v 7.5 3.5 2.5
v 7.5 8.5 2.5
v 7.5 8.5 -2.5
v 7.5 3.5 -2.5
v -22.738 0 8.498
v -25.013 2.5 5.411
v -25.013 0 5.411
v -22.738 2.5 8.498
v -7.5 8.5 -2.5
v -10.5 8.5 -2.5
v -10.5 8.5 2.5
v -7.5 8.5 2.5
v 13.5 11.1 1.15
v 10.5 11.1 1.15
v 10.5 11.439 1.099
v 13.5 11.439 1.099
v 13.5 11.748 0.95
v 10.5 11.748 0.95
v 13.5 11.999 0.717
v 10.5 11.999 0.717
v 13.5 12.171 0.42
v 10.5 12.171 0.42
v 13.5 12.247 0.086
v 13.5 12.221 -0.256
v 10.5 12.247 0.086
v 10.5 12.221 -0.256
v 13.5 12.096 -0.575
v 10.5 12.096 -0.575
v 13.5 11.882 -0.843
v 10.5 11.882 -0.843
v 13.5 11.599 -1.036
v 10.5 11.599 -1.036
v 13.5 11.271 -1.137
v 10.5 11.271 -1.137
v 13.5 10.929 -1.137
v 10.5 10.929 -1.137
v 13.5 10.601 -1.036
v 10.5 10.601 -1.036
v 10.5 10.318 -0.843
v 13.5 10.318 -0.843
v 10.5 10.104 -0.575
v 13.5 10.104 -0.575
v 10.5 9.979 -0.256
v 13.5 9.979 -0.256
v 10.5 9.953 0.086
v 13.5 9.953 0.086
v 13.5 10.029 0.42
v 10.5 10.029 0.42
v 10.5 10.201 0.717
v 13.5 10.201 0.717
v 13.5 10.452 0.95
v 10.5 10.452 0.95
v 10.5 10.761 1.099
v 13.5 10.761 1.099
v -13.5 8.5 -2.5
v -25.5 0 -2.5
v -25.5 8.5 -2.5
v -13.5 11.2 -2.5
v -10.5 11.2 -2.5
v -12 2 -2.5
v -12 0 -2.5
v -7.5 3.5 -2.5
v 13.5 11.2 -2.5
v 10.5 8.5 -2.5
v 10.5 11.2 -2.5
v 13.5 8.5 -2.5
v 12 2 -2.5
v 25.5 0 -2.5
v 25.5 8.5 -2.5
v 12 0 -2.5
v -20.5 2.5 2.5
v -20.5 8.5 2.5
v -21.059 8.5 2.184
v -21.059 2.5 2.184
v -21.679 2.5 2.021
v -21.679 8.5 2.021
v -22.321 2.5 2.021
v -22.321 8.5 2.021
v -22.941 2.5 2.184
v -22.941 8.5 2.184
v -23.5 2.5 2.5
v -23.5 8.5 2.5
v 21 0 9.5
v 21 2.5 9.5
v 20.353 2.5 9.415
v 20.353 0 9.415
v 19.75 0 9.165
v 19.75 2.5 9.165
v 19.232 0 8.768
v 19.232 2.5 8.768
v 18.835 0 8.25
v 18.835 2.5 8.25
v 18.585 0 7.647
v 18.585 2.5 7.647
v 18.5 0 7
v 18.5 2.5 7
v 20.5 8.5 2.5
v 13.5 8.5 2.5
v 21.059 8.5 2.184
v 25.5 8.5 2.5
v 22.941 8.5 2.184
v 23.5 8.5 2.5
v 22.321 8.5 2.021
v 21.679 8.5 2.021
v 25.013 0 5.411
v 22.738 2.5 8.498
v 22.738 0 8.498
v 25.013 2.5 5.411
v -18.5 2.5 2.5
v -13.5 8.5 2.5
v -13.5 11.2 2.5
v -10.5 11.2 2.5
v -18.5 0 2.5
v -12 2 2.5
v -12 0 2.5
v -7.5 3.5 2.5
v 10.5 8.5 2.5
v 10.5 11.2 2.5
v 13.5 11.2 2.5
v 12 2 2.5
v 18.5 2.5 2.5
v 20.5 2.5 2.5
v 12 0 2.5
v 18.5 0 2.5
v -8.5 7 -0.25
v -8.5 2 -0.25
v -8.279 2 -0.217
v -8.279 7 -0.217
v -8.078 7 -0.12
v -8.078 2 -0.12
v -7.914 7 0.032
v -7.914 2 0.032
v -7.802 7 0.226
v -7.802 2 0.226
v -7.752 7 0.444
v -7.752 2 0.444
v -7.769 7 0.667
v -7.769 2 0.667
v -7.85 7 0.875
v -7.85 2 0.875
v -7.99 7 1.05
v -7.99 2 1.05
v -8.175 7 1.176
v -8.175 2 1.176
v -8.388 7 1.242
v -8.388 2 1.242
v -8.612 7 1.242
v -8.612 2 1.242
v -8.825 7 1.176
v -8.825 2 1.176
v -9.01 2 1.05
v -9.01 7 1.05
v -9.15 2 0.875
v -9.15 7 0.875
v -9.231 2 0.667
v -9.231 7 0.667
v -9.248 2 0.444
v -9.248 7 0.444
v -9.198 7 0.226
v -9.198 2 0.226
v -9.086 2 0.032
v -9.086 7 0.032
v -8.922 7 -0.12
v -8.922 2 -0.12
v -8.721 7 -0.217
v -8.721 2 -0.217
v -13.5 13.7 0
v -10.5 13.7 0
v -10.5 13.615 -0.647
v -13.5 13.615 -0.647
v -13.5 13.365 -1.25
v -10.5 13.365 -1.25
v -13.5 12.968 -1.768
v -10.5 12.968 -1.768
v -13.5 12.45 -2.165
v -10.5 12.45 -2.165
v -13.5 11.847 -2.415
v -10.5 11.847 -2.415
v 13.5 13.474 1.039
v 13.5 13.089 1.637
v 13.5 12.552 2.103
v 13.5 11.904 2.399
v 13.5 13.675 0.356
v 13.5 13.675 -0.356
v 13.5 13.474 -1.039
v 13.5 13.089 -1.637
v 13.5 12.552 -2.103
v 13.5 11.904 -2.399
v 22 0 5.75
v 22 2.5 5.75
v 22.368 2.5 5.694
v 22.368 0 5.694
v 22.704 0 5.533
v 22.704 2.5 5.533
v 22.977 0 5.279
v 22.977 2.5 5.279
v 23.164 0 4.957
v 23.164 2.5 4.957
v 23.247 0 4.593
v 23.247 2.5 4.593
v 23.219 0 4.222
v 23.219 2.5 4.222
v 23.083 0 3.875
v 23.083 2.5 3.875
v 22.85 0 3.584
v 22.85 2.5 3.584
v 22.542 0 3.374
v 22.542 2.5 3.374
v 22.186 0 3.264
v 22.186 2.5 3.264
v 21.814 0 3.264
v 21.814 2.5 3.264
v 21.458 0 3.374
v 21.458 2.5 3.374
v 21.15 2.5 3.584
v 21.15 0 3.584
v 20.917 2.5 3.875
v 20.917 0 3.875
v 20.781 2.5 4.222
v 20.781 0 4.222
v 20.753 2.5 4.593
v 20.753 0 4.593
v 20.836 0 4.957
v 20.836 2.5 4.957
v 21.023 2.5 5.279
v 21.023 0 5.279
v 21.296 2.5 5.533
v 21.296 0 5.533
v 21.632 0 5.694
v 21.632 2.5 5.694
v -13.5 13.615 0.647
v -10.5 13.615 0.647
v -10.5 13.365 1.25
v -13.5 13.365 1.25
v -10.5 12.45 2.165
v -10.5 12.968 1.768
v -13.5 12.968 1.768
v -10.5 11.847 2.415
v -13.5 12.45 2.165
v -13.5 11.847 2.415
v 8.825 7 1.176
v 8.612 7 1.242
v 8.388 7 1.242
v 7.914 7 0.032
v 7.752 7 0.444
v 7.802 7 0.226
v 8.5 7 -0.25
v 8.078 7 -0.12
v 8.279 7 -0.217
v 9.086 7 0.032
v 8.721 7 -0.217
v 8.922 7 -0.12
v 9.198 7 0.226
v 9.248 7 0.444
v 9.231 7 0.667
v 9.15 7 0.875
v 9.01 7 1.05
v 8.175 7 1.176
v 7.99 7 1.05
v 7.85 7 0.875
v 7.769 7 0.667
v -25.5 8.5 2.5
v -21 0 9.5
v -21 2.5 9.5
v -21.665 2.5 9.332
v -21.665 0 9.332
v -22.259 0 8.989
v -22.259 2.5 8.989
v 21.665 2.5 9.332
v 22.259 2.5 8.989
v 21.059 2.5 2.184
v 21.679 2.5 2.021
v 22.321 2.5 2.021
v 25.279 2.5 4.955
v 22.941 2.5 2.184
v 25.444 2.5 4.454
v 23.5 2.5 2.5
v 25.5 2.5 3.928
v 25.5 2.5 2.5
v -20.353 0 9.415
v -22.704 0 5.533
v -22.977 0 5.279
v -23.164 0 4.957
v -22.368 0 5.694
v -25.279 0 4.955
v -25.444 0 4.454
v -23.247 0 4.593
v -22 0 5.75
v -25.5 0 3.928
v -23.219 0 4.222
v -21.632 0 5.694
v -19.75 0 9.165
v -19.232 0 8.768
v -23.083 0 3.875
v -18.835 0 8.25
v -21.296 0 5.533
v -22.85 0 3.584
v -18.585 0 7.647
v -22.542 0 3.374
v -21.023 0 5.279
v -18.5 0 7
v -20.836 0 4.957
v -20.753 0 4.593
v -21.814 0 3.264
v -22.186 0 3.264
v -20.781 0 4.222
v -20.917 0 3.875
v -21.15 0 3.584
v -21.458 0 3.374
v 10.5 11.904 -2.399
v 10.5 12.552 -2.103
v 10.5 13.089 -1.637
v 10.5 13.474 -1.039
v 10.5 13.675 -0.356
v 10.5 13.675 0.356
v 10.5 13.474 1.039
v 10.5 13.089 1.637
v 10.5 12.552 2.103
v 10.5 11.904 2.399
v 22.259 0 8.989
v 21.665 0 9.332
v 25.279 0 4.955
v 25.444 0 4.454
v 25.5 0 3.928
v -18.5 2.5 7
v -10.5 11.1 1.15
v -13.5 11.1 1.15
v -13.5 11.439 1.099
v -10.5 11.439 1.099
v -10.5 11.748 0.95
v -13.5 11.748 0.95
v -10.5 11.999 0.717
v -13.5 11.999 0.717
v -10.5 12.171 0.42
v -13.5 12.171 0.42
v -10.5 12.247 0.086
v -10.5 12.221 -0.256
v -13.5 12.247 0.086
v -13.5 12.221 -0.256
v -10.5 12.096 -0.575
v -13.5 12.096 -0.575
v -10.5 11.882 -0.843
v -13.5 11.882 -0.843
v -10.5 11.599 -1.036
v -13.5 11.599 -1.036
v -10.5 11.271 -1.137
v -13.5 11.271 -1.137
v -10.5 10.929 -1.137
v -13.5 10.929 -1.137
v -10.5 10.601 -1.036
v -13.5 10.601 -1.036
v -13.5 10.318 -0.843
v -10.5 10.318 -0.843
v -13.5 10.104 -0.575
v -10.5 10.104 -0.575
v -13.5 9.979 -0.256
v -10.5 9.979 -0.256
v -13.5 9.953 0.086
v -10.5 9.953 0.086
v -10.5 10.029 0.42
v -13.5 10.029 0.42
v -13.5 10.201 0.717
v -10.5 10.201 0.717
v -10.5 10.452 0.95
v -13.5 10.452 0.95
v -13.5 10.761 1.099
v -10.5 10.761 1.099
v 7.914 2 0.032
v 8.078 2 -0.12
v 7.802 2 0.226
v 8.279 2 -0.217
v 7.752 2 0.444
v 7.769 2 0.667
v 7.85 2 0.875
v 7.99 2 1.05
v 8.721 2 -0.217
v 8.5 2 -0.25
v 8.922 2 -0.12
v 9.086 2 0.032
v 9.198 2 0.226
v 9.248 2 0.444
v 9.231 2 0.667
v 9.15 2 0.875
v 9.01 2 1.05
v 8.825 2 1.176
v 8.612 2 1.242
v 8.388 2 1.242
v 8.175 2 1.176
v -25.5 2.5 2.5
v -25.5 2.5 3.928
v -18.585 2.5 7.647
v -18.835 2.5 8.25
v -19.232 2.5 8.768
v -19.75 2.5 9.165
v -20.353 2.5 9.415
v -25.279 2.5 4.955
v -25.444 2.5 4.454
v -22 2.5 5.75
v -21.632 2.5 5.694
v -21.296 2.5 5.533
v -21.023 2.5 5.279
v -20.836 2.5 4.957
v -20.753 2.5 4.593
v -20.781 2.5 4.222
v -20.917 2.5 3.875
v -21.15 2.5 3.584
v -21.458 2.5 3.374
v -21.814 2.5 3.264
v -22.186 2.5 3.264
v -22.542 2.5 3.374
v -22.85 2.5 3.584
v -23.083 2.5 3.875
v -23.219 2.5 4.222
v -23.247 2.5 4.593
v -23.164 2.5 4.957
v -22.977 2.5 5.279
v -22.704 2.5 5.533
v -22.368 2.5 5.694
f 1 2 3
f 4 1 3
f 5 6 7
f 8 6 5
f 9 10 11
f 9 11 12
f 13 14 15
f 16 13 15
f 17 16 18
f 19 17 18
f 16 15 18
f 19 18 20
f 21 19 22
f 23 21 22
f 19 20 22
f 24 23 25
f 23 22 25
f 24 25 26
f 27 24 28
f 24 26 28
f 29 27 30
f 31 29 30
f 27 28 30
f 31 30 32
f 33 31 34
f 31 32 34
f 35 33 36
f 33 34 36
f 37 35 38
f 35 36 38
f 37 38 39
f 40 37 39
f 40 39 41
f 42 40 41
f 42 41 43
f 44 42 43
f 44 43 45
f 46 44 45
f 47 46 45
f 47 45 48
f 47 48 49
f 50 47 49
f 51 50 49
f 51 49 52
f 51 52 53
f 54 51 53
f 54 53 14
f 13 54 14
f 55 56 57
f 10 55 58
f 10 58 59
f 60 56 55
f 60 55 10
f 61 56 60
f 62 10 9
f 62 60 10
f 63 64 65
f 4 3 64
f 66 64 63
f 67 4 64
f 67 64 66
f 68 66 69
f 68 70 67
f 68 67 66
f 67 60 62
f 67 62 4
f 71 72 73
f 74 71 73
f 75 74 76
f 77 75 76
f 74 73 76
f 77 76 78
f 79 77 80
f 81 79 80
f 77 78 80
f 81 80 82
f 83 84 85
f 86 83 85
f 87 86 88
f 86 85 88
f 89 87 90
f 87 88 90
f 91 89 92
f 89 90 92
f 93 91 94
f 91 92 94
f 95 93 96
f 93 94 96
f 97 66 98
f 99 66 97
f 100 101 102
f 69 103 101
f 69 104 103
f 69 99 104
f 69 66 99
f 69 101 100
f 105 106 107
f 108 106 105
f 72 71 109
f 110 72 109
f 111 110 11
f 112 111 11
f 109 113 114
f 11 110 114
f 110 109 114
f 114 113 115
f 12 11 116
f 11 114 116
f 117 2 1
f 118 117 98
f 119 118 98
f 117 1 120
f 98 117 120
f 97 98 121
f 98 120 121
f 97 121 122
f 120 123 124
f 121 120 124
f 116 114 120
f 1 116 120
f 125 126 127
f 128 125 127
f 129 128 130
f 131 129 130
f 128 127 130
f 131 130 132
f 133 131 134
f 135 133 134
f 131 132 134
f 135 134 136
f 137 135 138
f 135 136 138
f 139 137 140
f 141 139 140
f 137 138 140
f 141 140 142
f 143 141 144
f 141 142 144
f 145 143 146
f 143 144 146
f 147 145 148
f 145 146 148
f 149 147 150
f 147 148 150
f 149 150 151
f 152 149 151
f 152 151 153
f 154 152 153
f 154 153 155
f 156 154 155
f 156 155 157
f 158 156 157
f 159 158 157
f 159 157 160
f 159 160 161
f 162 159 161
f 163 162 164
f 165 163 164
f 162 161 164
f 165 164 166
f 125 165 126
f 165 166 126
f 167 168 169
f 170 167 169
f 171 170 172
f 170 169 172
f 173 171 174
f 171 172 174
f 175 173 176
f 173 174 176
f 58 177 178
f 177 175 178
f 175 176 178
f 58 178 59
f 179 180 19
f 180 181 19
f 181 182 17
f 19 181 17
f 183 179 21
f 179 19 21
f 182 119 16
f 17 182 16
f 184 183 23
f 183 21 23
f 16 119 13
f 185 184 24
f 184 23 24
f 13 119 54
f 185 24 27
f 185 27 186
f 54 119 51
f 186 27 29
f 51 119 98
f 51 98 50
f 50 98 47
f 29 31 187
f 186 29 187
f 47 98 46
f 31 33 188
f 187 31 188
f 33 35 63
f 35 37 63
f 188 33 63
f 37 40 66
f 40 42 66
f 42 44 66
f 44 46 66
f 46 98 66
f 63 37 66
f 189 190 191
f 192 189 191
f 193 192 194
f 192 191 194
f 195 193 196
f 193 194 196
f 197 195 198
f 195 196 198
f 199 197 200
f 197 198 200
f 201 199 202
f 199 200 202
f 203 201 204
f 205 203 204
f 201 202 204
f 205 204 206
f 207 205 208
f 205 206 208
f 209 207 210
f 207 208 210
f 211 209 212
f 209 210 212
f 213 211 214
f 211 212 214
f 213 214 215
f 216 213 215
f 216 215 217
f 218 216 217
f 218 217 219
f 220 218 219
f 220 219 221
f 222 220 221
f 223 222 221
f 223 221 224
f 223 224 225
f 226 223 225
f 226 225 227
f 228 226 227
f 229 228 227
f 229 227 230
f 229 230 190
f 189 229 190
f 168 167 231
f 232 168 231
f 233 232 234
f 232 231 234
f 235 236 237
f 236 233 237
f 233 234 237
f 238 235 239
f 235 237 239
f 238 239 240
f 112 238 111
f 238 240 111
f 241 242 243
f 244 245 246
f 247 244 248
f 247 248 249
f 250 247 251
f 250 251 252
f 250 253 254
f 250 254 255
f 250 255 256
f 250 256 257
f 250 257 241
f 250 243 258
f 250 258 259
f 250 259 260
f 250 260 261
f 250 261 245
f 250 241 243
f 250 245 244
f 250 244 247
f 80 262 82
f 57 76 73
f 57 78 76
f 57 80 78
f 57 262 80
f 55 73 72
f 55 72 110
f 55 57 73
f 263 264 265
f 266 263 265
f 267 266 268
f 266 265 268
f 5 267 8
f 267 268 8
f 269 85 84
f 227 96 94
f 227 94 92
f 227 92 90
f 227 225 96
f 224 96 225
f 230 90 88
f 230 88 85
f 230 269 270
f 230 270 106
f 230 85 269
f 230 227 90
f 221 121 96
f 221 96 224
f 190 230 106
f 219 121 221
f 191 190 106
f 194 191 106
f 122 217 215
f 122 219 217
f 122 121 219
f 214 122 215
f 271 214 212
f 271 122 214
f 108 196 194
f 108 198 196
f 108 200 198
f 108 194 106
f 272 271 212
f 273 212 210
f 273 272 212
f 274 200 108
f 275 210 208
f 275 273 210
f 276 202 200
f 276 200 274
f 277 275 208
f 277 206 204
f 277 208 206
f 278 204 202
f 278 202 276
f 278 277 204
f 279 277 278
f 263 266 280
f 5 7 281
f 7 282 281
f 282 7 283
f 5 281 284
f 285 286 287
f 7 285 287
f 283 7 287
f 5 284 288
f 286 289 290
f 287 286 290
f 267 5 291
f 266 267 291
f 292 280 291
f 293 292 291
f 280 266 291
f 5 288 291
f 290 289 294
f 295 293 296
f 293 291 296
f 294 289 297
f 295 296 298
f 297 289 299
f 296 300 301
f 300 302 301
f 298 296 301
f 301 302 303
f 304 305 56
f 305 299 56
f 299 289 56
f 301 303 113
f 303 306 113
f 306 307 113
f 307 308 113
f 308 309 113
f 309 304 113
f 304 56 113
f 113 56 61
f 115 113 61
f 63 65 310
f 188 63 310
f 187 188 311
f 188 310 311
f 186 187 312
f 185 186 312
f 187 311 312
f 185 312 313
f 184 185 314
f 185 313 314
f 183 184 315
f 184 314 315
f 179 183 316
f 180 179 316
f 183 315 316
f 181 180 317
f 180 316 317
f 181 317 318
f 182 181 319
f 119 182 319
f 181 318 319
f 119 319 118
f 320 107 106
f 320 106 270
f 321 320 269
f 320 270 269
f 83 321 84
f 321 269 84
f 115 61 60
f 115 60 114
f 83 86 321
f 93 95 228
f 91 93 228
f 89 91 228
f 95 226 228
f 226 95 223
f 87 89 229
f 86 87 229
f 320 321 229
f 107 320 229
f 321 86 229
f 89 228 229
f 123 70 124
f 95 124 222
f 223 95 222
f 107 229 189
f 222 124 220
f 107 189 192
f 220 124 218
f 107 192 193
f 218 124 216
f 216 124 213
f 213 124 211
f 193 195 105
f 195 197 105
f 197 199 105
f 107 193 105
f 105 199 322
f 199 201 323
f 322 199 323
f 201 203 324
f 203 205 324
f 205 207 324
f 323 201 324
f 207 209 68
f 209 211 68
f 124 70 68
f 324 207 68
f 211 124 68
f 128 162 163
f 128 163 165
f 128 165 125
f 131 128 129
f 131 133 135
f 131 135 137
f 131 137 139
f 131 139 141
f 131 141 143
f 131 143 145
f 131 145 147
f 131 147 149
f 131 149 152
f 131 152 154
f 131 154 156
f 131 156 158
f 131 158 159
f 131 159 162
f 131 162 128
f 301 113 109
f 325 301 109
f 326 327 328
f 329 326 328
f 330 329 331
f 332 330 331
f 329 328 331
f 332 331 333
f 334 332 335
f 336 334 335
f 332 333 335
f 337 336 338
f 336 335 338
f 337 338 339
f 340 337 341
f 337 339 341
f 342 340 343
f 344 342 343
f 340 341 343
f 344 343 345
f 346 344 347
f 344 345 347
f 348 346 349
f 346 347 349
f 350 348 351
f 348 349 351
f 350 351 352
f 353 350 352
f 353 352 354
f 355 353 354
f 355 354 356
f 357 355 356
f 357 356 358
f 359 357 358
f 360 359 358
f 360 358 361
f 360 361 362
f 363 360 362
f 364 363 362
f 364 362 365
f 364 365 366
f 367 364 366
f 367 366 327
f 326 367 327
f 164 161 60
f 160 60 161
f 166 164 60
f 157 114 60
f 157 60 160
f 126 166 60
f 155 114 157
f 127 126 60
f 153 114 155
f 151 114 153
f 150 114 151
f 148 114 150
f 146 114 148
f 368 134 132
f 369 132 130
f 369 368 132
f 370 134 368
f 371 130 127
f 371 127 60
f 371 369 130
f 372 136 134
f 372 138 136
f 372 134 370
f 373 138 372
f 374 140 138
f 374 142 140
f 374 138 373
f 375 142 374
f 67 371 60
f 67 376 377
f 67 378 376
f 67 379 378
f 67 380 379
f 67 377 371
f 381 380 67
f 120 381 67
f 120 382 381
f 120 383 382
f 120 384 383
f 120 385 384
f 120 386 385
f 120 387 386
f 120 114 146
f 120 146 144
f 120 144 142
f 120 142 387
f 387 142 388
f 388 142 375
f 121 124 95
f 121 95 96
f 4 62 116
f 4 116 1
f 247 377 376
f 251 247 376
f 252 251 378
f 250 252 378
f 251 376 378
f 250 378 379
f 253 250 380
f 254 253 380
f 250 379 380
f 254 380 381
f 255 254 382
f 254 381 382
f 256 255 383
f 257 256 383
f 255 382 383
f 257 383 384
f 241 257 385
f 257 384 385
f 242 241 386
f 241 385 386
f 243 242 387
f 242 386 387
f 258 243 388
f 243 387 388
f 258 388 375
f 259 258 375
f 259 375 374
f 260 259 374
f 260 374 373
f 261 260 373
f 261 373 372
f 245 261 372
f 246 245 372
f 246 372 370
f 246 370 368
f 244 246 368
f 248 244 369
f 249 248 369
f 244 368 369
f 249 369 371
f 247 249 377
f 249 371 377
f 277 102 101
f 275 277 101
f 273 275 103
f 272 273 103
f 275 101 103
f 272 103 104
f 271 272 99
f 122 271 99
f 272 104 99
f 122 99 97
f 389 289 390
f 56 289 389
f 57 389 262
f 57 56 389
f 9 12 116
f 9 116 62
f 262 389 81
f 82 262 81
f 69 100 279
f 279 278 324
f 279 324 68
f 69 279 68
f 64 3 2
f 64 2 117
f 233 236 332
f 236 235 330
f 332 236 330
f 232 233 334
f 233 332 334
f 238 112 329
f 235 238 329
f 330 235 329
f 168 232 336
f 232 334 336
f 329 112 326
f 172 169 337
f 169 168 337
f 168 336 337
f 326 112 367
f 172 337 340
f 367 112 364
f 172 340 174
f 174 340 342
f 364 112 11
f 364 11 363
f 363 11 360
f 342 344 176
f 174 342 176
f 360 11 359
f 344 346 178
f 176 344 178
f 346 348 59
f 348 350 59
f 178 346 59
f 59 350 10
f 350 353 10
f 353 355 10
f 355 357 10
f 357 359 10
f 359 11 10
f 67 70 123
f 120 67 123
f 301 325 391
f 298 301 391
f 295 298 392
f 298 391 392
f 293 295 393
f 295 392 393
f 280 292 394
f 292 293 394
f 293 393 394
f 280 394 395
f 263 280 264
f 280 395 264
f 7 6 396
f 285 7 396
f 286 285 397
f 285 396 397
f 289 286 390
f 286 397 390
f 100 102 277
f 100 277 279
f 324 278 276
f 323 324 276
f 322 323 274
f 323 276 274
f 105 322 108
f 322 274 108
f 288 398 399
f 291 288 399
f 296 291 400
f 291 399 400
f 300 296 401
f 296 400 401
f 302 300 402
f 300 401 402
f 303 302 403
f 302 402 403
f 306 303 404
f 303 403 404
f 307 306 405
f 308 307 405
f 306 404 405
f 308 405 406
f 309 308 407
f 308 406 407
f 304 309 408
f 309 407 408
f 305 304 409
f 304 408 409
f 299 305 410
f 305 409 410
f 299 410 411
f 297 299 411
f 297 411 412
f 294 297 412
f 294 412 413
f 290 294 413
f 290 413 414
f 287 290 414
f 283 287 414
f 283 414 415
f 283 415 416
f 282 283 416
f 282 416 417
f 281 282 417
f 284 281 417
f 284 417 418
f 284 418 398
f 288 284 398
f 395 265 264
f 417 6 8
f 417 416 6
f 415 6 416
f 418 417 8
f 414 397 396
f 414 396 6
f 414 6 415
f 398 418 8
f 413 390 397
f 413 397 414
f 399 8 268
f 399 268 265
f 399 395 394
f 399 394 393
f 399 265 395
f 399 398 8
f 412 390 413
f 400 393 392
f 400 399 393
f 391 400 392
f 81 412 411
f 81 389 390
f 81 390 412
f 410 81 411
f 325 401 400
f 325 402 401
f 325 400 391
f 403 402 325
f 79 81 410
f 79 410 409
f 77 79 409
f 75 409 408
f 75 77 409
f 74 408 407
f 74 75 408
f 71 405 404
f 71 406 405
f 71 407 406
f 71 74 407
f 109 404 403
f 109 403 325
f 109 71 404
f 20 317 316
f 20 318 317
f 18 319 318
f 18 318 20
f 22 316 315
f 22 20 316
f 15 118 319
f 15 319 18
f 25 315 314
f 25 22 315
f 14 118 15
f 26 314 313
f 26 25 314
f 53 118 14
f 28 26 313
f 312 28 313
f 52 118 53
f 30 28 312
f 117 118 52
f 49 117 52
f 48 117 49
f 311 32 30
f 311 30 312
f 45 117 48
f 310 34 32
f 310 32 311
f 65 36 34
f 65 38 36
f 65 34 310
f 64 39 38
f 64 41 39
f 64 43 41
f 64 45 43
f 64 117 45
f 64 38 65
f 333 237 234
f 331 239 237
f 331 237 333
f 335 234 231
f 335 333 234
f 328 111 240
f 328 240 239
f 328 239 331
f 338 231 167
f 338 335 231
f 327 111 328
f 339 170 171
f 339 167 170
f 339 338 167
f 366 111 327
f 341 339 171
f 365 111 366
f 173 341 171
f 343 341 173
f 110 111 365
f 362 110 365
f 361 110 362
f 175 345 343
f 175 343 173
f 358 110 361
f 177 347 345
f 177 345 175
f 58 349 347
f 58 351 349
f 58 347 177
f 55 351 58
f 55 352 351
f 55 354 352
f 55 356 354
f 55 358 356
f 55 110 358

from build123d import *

# Parameters (mm, degrees)
SKETCH1_W           = 51
SKETCH1_H           = 5
BOSS_EXTRUDE1_DEPTH = 8.5
SKETCH2_W           = 15
SKETCH2_H           = 5
CUT_EXTRUDE1_DEPTH  = 5
SKETCH3_W           = 24
SKETCH3_H           = 5
CUT_EXTRUDE2_DEPTH  = 2
SKETCH4_W           = 7
SKETCH4_H           = 2.5
BOSS_EXTRUDE2_DEPTH = 7
SKETCH5_W           = 3
SKETCH5_H           = 5
BOSS_EXTRUDE3_DEPTH = 5.2
SKETCH6_R           = 1.25
CUT_EXTRUDE3_DEPTH  = 30.42685848
SKETCH7_R           = 0.75
CUT_EXTRUDE4_DEPTH  = 5
SKETCH8_R           = 1.15
CUT_EXTRUDE5_DEPTH  = 43.413912812
SKETCH9_R           = 2.5
CUT_EXTRUDE6_DEPTH  = 6
FILLET1_R           = 2.5
CUT_EXTRUDE7_DEPTH  = 30.42685848
FILLET2_R           = 2.5


with BuildPart() as part:
    # Sketch1 → Boss-Extrude1 (new body)
    with BuildSketch(Plane(origin=(0, 0, 0), x_dir=(1, 0, 0), z_dir=(0, 1, 0))):
        Rectangle(SKETCH1_W, SKETCH1_H)
    extrude(amount=BOSS_EXTRUDE1_DEPTH)

    # Sketch2 → Cut-Extrude1 (cut)
    with BuildSketch(Plane(origin=(0, 8.5, 0), x_dir=(1, 0, 0), z_dir=(0, 1, 0))):
        Rectangle(SKETCH2_W, SKETCH2_H)
    extrude(amount=-CUT_EXTRUDE1_DEPTH, mode=Mode.SUBTRACT)

    # Sketch3 → Cut-Extrude2 (cut)
    with BuildSketch(Plane.XZ):
        Rectangle(SKETCH3_W, SKETCH3_H)
    extrude(amount=-CUT_EXTRUDE2_DEPTH, mode=Mode.SUBTRACT)

    # Sketch4 → Boss-Extrude2 (add)
    with BuildSketch(Plane.XY.offset(2.5)):
        with Locations((-22, 1.25)):
            Rectangle(SKETCH4_W, SKETCH4_H)
        with Locations((22, 1.25)):
            Rectangle(SKETCH4_W, SKETCH4_H)
    extrude(amount=BOSS_EXTRUDE2_DEPTH)

    # Sketch5 → Boss-Extrude3 (add)
    with BuildSketch(Plane(origin=(0, 8.5, 0), x_dir=(1, 0, 0), z_dir=(0, 1, 0))):
        with Locations((-12, 0)):
            Rectangle(SKETCH5_W, SKETCH5_H)
        with Locations((12, 0)):
            Rectangle(SKETCH5_W, SKETCH5_H)
    extrude(amount=BOSS_EXTRUDE3_DEPTH)

    # Sketch6 → Cut-Extrude3 (cut, through all)
    with BuildSketch(Plane(origin=(0, 2.5, 0), x_dir=(1, 0, 0), z_dir=(0, 1, 0))):
        with Locations(Location((-22, -4.5, 0), (0, 0, 270))):
            Circle(SKETCH6_R)
        with Locations(Location((22, -4.5, 0), (0, 0, 270))):
            Circle(SKETCH6_R)
    extrude(amount=-CUT_EXTRUDE3_DEPTH, mode=Mode.SUBTRACT)

    # Sketch7 → Cut-Extrude4 (cut)
    with BuildSketch(Plane.XZ.offset(-2)):
        with Locations(Location((-8.5, 0.5, 0), (0, 0, 270))):
            Circle(SKETCH7_R)
        with Locations(Location((8.5, 0.5, 0), (0, 0, 270))):
            Circle(SKETCH7_R)
    extrude(amount=-CUT_EXTRUDE4_DEPTH, mode=Mode.SUBTRACT)

    # Sketch8 → Cut-Extrude5 (cut, through all)
    with BuildSketch(Plane.ZY.offset(13.5)):
        with Locations((0, 11.1)):
            Circle(SKETCH8_R)
    extrude(amount=-CUT_EXTRUDE5_DEPTH, mode=Mode.SUBTRACT)

    # Sketch9 → Cut-Extrude6 (cut)
    with BuildSketch(Plane(origin=(0, 8.5, 0), x_dir=(1, 0, 0), z_dir=(0, 1, 0))):
        with Locations((-22, -4.5)):
            Circle(SKETCH9_R)
        with Locations((22, -4.5)):
            Circle(SKETCH9_R)
    extrude(amount=-CUT_EXTRUDE6_DEPTH, mode=Mode.SUBTRACT)

    # Fillet1
    # the kernel refuses this fillet: 2.5 mm, written as the material it takes off along each edge
    with BuildSketch(Plane(origin=(-25.5, -6.25, 9.5), x_dir=(0, 0, -1), z_dir=(0, 1, 0)), Plane(origin=(-18.5, 8.75, 9.5), x_dir=(0, 0, -1), z_dir=(0, -1, 0))) as fillet1_piece_1:
        with BuildLine():
            CenterArc((FILLET1_R, -FILLET1_R), FILLET1_R, 90, 90)
            Line((0, -FILLET1_R), (0, 0))
            Line((0, 0), (FILLET1_R, 0))
        make_face()
    extrude(amount=15, mode=Mode.SUBTRACT)
    with BuildSketch(Plane(origin=(18.5, 8.75, 9.5), x_dir=(0, 0, -1), z_dir=(0, -1, 0)), Plane(origin=(25.5, -6.25, 9.5), x_dir=(0, 0, -1), z_dir=(0, 1, 0))) as fillet1_piece_2:
        with BuildLine():
            CenterArc((FILLET1_R, FILLET1_R), FILLET1_R, 180, 90)
            Line((0, FILLET1_R), (0, 0))
            Line((0, 0), (FILLET1_R, 0))
        make_face()
    extrude(amount=15, mode=Mode.SUBTRACT)
    with BuildSketch(Plane(origin=(-4.25, 13.7, -2.5), x_dir=(0, 0, 1), z_dir=(-1, 0, 0)), Plane(origin=(19.75, 13.7, 2.5), x_dir=(0, -1, 0), z_dir=(-1, 0, 0))) as fillet1_piece_3:
        with BuildLine():
            CenterArc((FILLET1_R, -FILLET1_R), FILLET1_R, 90, 90)
            Line((0, -FILLET1_R), (0, 0))
            Line((0, 0), (FILLET1_R, 0))
        make_face()
    extrude(amount=15.5, mode=Mode.SUBTRACT)
    with BuildSketch(Plane(origin=(-19.75, 13.7, 2.5), x_dir=(0, -1, 0), z_dir=(1, 0, 0)), Plane(origin=(4.25, 13.7, -2.5), x_dir=(0, 0, 1), z_dir=(1, 0, 0))) as fillet1_piece_4:
        with BuildLine():
            CenterArc((FILLET1_R, FILLET1_R), FILLET1_R, 180, 90)
            Line((0, FILLET1_R), (0, 0))
            Line((0, 0), (FILLET1_R, 0))
        make_face()
    extrude(amount=15.5, mode=Mode.SUBTRACT)

    # Sketch10 → Cut-Extrude7 (cut, through all)
    with BuildSketch(Plane(origin=(0, 2.5, 0), x_dir=(1, 0, 0), z_dir=(0, 1, 0))):
        Polygon((-25.5, -4.75), (-22, -9.5), (-25.5, -9.5), align=None)
        Polygon((25.5, -4.75), (25.5, -9.5), (22, -9.5), align=None)
    extrude(amount=-CUT_EXTRUDE7_DEPTH, mode=Mode.SUBTRACT)

    # Fillet2
    # the kernel refuses this fillet: 2.5 mm, written as the material it takes off along each edge
    with BuildSketch(Plane(origin=(25.5, 4.553949751, 4.75), x_dir=(-0.5931990380498499, 0, 0.8050558373533682), z_dir=(0, -1, 0)), Plane(origin=(-25.5, 4.553949751, 4.75), x_dir=(0, 0, -1), z_dir=(0, -1, 0))) as fillet2_piece_1:
        with BuildLine():
            CenterArc((FILLET2_R * 0.328631960172, FILLET2_R), FILLET2_R, 233.615648184, 36.384351816)
            Line((-FILLET2_R * 0.264567077878, FILLET2_R * 0.194944162647), (-FILLET2_R * 0.276431058639, FILLET2_R * 0.1788430459))
            Line((-FILLET2_R * 0.276431058639, FILLET2_R * 0.1788430459), (-FILLET2_R * 0.00657263920345, -FILLET2_R * 0.02))
            Line((-FILLET2_R * 0.00657263920345, -FILLET2_R * 0.02), (FILLET2_R * 0.328631960172, -FILLET2_R * 0.02))
            Line((FILLET2_R * 0.328631960172, -FILLET2_R * 0.02), (FILLET2_R * 0.328631960172, 0))
        make_face()
    extrude(amount=6.607899502, mode=Mode.SUBTRACT)
    with BuildSketch(Plane(origin=(22, 5.611268046, 9.5), x_dir=(-1, 0, 0), z_dir=(0, -1, 0))) as fillet2_piece_2:
        with BuildLine():
            CenterArc((1.274399108, 2.484895396), FILLET2_R, 216.384351816, 47.314187929)
            Line((-0.738240485, 1.001897801), (-0.778493277, 0.972237849))
            Line((-0.778493277, 0.972237849), (-0.040252792, -0.029659952))
            Line((-0.040252792, -0.029659952), (0, -0.05))
            ThreePointArc((0, -0.05), (0.5, -0.05), (0.994512018, -0.049697908))
            Line((0.994512018, -0.049697908), (1, 0))
        make_face()
    extrude(amount=8.722536093, mode=Mode.SUBTRACT)
    with BuildSketch(Plane(origin=(-22, 5.611268046, 9.5), x_dir=(-0.5931990380498491, 0, -0.8050558373533688), z_dir=(0, -1, 0))) as fillet2_piece_3:
        with BuildLine():
            CenterArc((1.244507219, 2.5), FILLET2_R, 222.685812071, 47.314187929)
            Line((-0.593199038, 0.805055837), (-0.629953163, 0.771156954))
            ThreePointArc((-0.629953163, 0.771156954), (-0.336852311, 0.372867967), (-0.040252792, -0.029659952))
            Line((-0.040252792, -0.029659952), (0, -0.05))
            Line((0, -0.05), (1.244507219, -0.05))
            Line((1.244507219, -0.05), (1.244507219, 0))
        make_face()
    extrude(amount=8.722536093, mode=Mode.SUBTRACT)


solid = part.part
